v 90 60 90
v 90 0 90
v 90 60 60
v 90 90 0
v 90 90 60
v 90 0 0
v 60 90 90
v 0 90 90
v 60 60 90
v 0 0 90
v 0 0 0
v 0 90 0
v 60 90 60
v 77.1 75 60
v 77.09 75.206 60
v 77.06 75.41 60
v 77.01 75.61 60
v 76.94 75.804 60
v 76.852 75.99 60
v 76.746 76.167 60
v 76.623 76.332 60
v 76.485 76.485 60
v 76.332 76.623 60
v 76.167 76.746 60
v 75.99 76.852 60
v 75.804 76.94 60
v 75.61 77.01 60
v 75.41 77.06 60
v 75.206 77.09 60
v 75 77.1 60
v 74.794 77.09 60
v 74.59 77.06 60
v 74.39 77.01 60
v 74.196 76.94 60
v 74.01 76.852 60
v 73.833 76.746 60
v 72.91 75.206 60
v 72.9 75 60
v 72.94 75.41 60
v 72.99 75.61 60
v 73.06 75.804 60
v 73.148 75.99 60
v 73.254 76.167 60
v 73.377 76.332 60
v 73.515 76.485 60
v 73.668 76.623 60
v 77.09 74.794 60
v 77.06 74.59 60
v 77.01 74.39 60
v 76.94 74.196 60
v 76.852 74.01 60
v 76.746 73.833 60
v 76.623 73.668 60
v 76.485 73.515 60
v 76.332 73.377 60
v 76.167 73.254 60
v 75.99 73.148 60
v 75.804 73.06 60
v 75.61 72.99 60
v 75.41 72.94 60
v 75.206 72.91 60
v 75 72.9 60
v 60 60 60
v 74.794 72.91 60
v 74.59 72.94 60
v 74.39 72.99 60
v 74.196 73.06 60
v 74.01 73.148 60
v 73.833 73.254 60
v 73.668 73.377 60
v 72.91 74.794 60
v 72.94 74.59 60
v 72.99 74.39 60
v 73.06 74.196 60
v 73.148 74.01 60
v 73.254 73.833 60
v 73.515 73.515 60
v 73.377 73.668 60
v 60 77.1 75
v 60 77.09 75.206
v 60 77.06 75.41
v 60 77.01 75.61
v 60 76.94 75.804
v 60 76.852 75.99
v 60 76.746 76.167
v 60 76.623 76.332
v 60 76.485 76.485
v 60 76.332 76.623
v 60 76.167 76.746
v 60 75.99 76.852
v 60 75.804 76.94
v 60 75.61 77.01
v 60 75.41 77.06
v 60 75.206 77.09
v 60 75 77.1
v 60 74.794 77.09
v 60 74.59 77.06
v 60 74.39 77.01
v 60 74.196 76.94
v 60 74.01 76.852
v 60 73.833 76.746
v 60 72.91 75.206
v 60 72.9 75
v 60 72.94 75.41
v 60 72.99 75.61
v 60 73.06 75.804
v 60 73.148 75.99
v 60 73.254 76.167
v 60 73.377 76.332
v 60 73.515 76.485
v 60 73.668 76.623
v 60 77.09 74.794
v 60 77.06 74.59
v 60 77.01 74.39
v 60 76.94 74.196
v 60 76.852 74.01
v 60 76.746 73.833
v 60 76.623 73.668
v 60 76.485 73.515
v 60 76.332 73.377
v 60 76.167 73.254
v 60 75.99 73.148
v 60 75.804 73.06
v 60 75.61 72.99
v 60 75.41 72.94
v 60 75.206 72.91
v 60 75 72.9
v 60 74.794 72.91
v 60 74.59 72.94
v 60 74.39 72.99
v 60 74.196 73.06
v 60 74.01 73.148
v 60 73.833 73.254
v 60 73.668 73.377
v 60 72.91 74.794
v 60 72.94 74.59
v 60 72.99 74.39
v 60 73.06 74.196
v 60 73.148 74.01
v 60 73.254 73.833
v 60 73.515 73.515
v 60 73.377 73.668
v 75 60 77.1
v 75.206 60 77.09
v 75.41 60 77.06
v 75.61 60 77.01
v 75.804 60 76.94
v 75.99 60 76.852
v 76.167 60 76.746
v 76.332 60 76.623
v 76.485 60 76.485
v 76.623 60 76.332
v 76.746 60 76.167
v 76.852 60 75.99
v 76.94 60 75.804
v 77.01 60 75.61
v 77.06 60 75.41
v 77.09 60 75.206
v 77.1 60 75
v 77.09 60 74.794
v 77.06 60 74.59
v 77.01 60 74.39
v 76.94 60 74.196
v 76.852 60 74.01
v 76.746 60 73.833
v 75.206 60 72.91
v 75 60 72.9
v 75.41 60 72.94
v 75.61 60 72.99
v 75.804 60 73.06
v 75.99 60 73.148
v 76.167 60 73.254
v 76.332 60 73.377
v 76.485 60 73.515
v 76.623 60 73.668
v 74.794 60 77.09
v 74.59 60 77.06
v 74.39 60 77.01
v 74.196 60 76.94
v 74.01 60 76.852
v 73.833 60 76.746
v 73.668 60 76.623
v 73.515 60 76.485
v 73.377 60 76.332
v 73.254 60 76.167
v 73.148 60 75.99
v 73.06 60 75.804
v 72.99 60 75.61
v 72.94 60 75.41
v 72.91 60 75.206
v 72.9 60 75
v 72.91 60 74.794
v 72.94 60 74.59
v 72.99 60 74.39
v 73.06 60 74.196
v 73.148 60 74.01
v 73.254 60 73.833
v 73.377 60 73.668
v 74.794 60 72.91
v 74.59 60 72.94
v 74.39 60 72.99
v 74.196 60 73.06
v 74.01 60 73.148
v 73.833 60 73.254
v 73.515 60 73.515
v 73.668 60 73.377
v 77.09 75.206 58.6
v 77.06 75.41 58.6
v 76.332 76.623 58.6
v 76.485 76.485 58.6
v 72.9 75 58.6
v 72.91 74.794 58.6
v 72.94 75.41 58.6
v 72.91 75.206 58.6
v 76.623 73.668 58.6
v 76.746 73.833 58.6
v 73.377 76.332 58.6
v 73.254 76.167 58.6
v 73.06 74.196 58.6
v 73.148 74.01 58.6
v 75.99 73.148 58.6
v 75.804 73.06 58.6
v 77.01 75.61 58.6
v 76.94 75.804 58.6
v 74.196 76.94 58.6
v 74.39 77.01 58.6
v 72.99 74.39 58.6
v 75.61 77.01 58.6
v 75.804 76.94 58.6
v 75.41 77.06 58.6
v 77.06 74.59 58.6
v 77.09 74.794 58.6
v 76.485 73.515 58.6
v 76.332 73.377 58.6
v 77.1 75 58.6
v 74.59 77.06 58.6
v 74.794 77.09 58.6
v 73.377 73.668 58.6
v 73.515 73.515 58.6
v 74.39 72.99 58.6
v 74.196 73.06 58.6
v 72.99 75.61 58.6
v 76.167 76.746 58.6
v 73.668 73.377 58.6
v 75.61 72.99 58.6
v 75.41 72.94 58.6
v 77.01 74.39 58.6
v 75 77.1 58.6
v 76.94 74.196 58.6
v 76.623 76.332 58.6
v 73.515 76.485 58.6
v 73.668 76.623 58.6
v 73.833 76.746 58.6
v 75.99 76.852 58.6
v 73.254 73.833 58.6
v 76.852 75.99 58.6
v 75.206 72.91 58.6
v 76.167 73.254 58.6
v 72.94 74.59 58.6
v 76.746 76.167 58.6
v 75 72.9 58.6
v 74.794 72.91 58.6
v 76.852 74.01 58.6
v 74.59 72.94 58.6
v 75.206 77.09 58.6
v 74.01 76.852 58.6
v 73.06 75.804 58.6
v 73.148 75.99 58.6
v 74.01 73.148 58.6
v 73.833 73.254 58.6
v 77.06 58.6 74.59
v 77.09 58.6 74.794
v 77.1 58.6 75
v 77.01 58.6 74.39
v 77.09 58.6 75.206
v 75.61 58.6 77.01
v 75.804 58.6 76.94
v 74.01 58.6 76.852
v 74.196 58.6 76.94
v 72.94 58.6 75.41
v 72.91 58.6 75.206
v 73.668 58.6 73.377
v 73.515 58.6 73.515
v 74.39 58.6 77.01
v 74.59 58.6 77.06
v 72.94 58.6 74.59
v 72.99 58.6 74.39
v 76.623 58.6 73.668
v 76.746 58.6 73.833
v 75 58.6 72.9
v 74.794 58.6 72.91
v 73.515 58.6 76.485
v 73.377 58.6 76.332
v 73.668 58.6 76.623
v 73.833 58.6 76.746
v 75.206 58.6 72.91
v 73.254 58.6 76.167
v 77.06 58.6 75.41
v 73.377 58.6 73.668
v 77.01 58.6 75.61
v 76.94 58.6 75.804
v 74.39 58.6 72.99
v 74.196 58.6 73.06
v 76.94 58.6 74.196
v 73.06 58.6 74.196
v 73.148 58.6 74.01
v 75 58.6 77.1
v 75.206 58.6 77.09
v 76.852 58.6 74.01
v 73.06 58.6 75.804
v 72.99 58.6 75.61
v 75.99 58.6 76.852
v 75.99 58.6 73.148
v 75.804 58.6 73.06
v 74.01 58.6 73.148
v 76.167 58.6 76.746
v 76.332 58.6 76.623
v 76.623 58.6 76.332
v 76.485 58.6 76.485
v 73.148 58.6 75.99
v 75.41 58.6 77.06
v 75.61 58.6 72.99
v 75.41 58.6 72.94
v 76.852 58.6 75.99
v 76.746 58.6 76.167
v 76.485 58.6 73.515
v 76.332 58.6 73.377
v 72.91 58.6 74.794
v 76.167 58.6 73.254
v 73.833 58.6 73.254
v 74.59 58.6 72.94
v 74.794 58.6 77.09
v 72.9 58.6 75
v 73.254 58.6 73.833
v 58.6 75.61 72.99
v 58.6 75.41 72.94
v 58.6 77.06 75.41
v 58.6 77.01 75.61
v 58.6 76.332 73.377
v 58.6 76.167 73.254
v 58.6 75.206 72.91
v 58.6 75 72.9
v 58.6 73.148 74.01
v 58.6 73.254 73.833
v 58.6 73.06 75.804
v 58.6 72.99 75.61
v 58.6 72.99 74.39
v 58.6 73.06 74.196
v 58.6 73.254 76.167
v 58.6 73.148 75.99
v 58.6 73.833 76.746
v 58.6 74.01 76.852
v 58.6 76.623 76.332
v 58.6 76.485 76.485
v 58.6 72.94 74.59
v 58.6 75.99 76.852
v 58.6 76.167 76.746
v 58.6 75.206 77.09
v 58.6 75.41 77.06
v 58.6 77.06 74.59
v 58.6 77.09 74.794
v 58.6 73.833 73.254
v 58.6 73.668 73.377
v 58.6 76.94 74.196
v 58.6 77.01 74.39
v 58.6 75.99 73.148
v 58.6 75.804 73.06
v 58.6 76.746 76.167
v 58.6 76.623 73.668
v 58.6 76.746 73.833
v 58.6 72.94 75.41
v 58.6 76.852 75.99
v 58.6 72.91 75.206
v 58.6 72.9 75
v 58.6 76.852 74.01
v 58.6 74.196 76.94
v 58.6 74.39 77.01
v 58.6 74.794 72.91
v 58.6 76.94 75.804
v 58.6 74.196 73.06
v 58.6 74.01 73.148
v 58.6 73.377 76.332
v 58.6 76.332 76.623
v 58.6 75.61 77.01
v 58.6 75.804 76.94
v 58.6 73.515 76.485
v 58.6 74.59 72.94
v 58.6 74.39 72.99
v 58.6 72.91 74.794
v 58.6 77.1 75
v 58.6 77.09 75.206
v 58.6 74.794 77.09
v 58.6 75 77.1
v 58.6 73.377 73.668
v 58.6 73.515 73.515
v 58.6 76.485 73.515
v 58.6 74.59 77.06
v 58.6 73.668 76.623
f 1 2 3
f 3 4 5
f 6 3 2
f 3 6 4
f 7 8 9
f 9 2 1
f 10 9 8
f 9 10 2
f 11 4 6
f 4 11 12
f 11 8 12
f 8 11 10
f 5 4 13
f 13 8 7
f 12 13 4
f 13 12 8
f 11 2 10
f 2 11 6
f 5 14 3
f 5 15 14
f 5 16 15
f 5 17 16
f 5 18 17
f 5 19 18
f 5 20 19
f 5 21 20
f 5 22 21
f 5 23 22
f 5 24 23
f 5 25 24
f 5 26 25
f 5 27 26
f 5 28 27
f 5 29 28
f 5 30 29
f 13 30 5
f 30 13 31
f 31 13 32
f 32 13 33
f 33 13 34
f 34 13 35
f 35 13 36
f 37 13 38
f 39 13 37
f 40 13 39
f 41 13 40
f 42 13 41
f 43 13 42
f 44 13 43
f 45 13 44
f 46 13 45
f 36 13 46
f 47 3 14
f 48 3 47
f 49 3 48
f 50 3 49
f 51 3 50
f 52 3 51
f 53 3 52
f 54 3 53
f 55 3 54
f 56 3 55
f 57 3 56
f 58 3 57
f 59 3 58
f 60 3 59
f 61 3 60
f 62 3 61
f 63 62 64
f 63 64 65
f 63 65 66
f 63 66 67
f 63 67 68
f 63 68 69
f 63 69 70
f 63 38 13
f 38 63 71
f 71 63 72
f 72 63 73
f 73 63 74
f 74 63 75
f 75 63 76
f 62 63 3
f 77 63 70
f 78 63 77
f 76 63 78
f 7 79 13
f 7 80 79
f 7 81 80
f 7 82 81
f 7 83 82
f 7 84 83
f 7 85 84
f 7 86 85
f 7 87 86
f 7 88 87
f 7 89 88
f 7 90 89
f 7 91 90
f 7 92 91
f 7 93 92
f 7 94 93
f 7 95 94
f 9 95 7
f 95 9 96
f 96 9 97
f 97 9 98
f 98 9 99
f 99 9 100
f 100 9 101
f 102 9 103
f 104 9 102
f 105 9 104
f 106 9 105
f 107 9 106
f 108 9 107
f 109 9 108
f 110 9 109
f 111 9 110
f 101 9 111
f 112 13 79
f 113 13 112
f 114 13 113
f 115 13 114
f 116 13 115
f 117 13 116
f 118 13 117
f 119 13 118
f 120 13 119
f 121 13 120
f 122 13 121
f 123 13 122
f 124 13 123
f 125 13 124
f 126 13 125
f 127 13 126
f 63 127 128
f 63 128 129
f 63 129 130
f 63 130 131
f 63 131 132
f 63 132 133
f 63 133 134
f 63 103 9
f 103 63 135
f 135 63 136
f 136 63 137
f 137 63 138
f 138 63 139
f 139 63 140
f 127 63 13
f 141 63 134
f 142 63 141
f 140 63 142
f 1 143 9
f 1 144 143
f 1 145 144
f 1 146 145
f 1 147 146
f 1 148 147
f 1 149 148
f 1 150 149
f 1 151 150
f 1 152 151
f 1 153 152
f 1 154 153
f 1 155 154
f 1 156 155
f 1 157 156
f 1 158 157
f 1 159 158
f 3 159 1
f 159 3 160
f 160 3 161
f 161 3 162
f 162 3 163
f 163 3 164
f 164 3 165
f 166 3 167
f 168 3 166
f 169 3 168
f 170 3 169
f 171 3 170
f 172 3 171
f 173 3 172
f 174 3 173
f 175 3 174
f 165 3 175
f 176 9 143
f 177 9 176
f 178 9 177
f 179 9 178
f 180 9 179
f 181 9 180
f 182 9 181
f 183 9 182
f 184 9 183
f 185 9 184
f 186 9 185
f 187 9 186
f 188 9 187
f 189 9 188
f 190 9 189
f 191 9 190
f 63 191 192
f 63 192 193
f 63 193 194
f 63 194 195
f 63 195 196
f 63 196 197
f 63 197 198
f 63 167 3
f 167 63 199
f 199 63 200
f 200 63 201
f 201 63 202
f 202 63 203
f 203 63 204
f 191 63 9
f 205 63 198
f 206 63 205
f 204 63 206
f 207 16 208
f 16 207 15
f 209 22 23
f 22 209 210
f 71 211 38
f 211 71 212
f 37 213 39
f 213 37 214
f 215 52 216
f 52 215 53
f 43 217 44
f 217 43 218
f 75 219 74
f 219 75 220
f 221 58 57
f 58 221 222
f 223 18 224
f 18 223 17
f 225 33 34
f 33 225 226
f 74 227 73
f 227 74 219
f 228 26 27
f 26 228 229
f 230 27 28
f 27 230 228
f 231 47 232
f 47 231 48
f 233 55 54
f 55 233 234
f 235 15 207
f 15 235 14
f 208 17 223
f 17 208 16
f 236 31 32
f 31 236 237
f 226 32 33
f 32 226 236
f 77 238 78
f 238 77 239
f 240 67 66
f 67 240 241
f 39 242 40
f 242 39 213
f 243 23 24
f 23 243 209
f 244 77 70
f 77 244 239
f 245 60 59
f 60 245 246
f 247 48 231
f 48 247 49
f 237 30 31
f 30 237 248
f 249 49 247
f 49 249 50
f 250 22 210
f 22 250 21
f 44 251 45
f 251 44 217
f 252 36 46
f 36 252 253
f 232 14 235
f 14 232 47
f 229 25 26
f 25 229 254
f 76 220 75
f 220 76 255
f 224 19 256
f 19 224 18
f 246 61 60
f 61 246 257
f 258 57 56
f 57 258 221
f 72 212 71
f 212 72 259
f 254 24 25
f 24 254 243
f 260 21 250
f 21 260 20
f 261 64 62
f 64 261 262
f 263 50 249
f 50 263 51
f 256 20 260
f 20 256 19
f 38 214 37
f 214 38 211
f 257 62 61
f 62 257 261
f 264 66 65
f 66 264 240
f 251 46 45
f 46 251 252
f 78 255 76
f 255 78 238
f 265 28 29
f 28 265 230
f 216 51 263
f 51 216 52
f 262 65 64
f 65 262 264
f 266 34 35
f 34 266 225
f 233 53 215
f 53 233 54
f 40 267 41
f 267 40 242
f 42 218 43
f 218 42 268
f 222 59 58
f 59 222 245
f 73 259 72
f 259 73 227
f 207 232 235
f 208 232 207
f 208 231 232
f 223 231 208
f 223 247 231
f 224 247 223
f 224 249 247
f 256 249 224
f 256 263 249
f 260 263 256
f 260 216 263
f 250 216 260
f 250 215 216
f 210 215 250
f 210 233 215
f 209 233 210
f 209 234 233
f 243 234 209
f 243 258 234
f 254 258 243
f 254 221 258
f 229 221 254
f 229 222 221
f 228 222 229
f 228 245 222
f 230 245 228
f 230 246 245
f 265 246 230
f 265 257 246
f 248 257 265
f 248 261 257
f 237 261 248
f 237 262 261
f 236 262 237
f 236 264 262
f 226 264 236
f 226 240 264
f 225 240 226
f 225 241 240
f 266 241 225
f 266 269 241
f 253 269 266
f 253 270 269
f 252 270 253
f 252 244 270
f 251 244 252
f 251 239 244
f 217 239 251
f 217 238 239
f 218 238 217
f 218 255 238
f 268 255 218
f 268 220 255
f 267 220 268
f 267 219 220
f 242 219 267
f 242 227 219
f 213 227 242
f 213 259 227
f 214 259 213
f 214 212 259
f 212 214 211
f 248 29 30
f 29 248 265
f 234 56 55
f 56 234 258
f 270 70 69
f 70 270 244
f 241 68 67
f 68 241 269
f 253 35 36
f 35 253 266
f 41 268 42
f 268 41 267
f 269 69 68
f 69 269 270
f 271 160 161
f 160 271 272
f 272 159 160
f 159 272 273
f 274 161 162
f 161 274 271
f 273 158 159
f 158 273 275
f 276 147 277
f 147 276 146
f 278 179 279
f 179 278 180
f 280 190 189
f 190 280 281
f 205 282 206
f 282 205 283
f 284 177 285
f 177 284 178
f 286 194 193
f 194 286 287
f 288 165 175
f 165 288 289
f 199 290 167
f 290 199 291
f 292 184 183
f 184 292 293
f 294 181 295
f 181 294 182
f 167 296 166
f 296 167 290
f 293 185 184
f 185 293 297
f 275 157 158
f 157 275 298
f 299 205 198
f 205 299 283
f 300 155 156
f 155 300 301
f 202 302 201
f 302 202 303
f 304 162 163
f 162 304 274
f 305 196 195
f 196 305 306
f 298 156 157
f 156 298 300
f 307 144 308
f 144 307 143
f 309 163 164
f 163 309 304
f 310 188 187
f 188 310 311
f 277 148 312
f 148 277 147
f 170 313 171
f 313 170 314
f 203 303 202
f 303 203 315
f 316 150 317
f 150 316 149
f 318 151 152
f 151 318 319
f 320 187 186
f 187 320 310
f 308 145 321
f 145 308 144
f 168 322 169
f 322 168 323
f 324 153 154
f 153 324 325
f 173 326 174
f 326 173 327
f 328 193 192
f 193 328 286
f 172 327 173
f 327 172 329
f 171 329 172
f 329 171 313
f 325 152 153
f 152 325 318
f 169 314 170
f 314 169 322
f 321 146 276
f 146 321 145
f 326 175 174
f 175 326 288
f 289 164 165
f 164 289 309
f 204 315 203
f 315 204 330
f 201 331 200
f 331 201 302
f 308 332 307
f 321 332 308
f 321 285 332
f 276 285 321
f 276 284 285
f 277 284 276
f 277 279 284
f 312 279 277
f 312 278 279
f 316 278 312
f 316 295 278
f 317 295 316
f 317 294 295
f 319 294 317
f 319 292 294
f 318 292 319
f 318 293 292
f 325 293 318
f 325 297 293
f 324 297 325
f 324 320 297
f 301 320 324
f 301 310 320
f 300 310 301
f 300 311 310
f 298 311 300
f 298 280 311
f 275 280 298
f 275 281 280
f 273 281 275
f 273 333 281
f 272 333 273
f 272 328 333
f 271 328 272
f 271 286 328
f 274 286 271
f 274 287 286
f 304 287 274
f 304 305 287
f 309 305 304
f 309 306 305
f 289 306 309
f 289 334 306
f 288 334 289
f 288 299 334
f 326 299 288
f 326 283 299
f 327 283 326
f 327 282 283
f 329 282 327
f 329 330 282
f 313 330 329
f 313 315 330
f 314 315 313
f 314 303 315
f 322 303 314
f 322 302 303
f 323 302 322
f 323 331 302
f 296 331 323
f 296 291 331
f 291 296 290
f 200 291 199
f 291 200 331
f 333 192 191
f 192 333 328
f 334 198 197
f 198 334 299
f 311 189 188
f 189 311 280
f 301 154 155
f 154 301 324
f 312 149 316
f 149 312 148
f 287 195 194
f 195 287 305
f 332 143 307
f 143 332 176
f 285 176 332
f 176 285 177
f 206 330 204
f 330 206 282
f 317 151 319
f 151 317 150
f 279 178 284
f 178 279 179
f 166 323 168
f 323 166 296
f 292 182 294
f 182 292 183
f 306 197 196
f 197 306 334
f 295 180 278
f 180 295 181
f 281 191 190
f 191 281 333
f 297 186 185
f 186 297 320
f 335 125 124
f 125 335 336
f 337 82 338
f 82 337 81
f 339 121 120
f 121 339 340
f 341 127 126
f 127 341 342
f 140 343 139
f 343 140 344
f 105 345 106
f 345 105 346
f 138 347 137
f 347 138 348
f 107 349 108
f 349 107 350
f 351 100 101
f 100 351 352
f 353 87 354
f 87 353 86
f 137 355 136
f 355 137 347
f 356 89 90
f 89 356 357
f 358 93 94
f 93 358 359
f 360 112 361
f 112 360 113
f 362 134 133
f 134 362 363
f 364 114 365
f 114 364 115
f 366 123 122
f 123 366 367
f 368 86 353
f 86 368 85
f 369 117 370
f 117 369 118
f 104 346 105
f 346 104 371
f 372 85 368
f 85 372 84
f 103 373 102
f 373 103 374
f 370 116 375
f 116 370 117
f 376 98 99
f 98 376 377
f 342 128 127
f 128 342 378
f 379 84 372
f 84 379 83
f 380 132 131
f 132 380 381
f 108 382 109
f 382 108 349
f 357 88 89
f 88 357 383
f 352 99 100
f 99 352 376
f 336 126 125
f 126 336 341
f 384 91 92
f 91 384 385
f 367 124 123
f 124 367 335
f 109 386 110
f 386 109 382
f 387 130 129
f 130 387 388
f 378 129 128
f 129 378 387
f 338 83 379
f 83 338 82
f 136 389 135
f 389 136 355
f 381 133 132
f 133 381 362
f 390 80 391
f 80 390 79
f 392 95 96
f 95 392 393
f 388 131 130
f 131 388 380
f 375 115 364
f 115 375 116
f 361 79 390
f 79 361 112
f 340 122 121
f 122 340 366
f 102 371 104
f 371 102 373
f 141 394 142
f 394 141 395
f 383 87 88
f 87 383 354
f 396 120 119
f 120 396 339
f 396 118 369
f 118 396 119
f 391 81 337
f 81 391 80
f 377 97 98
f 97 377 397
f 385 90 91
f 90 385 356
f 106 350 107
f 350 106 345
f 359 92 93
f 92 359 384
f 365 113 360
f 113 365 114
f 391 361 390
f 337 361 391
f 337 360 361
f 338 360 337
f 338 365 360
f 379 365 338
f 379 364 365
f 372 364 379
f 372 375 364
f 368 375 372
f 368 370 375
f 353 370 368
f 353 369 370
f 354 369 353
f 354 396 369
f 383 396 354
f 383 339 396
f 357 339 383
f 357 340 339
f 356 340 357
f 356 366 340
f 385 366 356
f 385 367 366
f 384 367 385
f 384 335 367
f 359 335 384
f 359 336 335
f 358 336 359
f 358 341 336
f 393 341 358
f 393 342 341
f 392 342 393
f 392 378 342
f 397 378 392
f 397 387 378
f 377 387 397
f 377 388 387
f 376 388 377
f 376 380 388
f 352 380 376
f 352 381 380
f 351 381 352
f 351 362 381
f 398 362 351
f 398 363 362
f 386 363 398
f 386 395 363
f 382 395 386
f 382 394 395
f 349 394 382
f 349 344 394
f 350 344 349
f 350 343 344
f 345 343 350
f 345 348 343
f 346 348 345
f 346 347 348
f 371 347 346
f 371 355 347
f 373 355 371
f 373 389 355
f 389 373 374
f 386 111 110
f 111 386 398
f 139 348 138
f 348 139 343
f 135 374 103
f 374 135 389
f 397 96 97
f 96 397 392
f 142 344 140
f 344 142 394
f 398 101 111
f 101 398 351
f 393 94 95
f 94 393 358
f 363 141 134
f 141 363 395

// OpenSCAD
$fn=64;

size=90; 

module magnet_hole(){
    cylinder(h=1.5, d=4.2); 
}

module big_cube(){
  difference(){
    cube([size, size, size]);
    translate([size-size/3, size-size/3, size-size/3])
      cube([size/3+1, size/3+1, size/3+1]);
    translate([size/3*2 + size/3/2, size/3*2 + size/3/2, size/3*2-1.4]) magnet_hole();
    translate([size/3*2 + size/3/2, size/3*2-1.4, size/3*2 + size/3/2]) 
      rotate(a=[270,0,0]) magnet_hole();
    translate([size/3*2-1.4, size/3*2 + size/3/2, size/3*2 + size/3/2]) 
      rotate(a=[0,90,0]) magnet_hole();
  }
}

module small_cube(){
  difference(){
    cube([size/3, size/3, size/3]);
    translate([size/3/2, size/3/2, 0]) magnet_hole();
    translate([size/3/2, 0, size/3/2]) 
      rotate(a=[270,0,0]) magnet_hole();
    translate([0, size/3/2, size/3/2]) 
      rotate(a=[0,90,0]) magnet_hole();
  }
}

module main(){
  //small_cube();
  big_cube();
}

main();
